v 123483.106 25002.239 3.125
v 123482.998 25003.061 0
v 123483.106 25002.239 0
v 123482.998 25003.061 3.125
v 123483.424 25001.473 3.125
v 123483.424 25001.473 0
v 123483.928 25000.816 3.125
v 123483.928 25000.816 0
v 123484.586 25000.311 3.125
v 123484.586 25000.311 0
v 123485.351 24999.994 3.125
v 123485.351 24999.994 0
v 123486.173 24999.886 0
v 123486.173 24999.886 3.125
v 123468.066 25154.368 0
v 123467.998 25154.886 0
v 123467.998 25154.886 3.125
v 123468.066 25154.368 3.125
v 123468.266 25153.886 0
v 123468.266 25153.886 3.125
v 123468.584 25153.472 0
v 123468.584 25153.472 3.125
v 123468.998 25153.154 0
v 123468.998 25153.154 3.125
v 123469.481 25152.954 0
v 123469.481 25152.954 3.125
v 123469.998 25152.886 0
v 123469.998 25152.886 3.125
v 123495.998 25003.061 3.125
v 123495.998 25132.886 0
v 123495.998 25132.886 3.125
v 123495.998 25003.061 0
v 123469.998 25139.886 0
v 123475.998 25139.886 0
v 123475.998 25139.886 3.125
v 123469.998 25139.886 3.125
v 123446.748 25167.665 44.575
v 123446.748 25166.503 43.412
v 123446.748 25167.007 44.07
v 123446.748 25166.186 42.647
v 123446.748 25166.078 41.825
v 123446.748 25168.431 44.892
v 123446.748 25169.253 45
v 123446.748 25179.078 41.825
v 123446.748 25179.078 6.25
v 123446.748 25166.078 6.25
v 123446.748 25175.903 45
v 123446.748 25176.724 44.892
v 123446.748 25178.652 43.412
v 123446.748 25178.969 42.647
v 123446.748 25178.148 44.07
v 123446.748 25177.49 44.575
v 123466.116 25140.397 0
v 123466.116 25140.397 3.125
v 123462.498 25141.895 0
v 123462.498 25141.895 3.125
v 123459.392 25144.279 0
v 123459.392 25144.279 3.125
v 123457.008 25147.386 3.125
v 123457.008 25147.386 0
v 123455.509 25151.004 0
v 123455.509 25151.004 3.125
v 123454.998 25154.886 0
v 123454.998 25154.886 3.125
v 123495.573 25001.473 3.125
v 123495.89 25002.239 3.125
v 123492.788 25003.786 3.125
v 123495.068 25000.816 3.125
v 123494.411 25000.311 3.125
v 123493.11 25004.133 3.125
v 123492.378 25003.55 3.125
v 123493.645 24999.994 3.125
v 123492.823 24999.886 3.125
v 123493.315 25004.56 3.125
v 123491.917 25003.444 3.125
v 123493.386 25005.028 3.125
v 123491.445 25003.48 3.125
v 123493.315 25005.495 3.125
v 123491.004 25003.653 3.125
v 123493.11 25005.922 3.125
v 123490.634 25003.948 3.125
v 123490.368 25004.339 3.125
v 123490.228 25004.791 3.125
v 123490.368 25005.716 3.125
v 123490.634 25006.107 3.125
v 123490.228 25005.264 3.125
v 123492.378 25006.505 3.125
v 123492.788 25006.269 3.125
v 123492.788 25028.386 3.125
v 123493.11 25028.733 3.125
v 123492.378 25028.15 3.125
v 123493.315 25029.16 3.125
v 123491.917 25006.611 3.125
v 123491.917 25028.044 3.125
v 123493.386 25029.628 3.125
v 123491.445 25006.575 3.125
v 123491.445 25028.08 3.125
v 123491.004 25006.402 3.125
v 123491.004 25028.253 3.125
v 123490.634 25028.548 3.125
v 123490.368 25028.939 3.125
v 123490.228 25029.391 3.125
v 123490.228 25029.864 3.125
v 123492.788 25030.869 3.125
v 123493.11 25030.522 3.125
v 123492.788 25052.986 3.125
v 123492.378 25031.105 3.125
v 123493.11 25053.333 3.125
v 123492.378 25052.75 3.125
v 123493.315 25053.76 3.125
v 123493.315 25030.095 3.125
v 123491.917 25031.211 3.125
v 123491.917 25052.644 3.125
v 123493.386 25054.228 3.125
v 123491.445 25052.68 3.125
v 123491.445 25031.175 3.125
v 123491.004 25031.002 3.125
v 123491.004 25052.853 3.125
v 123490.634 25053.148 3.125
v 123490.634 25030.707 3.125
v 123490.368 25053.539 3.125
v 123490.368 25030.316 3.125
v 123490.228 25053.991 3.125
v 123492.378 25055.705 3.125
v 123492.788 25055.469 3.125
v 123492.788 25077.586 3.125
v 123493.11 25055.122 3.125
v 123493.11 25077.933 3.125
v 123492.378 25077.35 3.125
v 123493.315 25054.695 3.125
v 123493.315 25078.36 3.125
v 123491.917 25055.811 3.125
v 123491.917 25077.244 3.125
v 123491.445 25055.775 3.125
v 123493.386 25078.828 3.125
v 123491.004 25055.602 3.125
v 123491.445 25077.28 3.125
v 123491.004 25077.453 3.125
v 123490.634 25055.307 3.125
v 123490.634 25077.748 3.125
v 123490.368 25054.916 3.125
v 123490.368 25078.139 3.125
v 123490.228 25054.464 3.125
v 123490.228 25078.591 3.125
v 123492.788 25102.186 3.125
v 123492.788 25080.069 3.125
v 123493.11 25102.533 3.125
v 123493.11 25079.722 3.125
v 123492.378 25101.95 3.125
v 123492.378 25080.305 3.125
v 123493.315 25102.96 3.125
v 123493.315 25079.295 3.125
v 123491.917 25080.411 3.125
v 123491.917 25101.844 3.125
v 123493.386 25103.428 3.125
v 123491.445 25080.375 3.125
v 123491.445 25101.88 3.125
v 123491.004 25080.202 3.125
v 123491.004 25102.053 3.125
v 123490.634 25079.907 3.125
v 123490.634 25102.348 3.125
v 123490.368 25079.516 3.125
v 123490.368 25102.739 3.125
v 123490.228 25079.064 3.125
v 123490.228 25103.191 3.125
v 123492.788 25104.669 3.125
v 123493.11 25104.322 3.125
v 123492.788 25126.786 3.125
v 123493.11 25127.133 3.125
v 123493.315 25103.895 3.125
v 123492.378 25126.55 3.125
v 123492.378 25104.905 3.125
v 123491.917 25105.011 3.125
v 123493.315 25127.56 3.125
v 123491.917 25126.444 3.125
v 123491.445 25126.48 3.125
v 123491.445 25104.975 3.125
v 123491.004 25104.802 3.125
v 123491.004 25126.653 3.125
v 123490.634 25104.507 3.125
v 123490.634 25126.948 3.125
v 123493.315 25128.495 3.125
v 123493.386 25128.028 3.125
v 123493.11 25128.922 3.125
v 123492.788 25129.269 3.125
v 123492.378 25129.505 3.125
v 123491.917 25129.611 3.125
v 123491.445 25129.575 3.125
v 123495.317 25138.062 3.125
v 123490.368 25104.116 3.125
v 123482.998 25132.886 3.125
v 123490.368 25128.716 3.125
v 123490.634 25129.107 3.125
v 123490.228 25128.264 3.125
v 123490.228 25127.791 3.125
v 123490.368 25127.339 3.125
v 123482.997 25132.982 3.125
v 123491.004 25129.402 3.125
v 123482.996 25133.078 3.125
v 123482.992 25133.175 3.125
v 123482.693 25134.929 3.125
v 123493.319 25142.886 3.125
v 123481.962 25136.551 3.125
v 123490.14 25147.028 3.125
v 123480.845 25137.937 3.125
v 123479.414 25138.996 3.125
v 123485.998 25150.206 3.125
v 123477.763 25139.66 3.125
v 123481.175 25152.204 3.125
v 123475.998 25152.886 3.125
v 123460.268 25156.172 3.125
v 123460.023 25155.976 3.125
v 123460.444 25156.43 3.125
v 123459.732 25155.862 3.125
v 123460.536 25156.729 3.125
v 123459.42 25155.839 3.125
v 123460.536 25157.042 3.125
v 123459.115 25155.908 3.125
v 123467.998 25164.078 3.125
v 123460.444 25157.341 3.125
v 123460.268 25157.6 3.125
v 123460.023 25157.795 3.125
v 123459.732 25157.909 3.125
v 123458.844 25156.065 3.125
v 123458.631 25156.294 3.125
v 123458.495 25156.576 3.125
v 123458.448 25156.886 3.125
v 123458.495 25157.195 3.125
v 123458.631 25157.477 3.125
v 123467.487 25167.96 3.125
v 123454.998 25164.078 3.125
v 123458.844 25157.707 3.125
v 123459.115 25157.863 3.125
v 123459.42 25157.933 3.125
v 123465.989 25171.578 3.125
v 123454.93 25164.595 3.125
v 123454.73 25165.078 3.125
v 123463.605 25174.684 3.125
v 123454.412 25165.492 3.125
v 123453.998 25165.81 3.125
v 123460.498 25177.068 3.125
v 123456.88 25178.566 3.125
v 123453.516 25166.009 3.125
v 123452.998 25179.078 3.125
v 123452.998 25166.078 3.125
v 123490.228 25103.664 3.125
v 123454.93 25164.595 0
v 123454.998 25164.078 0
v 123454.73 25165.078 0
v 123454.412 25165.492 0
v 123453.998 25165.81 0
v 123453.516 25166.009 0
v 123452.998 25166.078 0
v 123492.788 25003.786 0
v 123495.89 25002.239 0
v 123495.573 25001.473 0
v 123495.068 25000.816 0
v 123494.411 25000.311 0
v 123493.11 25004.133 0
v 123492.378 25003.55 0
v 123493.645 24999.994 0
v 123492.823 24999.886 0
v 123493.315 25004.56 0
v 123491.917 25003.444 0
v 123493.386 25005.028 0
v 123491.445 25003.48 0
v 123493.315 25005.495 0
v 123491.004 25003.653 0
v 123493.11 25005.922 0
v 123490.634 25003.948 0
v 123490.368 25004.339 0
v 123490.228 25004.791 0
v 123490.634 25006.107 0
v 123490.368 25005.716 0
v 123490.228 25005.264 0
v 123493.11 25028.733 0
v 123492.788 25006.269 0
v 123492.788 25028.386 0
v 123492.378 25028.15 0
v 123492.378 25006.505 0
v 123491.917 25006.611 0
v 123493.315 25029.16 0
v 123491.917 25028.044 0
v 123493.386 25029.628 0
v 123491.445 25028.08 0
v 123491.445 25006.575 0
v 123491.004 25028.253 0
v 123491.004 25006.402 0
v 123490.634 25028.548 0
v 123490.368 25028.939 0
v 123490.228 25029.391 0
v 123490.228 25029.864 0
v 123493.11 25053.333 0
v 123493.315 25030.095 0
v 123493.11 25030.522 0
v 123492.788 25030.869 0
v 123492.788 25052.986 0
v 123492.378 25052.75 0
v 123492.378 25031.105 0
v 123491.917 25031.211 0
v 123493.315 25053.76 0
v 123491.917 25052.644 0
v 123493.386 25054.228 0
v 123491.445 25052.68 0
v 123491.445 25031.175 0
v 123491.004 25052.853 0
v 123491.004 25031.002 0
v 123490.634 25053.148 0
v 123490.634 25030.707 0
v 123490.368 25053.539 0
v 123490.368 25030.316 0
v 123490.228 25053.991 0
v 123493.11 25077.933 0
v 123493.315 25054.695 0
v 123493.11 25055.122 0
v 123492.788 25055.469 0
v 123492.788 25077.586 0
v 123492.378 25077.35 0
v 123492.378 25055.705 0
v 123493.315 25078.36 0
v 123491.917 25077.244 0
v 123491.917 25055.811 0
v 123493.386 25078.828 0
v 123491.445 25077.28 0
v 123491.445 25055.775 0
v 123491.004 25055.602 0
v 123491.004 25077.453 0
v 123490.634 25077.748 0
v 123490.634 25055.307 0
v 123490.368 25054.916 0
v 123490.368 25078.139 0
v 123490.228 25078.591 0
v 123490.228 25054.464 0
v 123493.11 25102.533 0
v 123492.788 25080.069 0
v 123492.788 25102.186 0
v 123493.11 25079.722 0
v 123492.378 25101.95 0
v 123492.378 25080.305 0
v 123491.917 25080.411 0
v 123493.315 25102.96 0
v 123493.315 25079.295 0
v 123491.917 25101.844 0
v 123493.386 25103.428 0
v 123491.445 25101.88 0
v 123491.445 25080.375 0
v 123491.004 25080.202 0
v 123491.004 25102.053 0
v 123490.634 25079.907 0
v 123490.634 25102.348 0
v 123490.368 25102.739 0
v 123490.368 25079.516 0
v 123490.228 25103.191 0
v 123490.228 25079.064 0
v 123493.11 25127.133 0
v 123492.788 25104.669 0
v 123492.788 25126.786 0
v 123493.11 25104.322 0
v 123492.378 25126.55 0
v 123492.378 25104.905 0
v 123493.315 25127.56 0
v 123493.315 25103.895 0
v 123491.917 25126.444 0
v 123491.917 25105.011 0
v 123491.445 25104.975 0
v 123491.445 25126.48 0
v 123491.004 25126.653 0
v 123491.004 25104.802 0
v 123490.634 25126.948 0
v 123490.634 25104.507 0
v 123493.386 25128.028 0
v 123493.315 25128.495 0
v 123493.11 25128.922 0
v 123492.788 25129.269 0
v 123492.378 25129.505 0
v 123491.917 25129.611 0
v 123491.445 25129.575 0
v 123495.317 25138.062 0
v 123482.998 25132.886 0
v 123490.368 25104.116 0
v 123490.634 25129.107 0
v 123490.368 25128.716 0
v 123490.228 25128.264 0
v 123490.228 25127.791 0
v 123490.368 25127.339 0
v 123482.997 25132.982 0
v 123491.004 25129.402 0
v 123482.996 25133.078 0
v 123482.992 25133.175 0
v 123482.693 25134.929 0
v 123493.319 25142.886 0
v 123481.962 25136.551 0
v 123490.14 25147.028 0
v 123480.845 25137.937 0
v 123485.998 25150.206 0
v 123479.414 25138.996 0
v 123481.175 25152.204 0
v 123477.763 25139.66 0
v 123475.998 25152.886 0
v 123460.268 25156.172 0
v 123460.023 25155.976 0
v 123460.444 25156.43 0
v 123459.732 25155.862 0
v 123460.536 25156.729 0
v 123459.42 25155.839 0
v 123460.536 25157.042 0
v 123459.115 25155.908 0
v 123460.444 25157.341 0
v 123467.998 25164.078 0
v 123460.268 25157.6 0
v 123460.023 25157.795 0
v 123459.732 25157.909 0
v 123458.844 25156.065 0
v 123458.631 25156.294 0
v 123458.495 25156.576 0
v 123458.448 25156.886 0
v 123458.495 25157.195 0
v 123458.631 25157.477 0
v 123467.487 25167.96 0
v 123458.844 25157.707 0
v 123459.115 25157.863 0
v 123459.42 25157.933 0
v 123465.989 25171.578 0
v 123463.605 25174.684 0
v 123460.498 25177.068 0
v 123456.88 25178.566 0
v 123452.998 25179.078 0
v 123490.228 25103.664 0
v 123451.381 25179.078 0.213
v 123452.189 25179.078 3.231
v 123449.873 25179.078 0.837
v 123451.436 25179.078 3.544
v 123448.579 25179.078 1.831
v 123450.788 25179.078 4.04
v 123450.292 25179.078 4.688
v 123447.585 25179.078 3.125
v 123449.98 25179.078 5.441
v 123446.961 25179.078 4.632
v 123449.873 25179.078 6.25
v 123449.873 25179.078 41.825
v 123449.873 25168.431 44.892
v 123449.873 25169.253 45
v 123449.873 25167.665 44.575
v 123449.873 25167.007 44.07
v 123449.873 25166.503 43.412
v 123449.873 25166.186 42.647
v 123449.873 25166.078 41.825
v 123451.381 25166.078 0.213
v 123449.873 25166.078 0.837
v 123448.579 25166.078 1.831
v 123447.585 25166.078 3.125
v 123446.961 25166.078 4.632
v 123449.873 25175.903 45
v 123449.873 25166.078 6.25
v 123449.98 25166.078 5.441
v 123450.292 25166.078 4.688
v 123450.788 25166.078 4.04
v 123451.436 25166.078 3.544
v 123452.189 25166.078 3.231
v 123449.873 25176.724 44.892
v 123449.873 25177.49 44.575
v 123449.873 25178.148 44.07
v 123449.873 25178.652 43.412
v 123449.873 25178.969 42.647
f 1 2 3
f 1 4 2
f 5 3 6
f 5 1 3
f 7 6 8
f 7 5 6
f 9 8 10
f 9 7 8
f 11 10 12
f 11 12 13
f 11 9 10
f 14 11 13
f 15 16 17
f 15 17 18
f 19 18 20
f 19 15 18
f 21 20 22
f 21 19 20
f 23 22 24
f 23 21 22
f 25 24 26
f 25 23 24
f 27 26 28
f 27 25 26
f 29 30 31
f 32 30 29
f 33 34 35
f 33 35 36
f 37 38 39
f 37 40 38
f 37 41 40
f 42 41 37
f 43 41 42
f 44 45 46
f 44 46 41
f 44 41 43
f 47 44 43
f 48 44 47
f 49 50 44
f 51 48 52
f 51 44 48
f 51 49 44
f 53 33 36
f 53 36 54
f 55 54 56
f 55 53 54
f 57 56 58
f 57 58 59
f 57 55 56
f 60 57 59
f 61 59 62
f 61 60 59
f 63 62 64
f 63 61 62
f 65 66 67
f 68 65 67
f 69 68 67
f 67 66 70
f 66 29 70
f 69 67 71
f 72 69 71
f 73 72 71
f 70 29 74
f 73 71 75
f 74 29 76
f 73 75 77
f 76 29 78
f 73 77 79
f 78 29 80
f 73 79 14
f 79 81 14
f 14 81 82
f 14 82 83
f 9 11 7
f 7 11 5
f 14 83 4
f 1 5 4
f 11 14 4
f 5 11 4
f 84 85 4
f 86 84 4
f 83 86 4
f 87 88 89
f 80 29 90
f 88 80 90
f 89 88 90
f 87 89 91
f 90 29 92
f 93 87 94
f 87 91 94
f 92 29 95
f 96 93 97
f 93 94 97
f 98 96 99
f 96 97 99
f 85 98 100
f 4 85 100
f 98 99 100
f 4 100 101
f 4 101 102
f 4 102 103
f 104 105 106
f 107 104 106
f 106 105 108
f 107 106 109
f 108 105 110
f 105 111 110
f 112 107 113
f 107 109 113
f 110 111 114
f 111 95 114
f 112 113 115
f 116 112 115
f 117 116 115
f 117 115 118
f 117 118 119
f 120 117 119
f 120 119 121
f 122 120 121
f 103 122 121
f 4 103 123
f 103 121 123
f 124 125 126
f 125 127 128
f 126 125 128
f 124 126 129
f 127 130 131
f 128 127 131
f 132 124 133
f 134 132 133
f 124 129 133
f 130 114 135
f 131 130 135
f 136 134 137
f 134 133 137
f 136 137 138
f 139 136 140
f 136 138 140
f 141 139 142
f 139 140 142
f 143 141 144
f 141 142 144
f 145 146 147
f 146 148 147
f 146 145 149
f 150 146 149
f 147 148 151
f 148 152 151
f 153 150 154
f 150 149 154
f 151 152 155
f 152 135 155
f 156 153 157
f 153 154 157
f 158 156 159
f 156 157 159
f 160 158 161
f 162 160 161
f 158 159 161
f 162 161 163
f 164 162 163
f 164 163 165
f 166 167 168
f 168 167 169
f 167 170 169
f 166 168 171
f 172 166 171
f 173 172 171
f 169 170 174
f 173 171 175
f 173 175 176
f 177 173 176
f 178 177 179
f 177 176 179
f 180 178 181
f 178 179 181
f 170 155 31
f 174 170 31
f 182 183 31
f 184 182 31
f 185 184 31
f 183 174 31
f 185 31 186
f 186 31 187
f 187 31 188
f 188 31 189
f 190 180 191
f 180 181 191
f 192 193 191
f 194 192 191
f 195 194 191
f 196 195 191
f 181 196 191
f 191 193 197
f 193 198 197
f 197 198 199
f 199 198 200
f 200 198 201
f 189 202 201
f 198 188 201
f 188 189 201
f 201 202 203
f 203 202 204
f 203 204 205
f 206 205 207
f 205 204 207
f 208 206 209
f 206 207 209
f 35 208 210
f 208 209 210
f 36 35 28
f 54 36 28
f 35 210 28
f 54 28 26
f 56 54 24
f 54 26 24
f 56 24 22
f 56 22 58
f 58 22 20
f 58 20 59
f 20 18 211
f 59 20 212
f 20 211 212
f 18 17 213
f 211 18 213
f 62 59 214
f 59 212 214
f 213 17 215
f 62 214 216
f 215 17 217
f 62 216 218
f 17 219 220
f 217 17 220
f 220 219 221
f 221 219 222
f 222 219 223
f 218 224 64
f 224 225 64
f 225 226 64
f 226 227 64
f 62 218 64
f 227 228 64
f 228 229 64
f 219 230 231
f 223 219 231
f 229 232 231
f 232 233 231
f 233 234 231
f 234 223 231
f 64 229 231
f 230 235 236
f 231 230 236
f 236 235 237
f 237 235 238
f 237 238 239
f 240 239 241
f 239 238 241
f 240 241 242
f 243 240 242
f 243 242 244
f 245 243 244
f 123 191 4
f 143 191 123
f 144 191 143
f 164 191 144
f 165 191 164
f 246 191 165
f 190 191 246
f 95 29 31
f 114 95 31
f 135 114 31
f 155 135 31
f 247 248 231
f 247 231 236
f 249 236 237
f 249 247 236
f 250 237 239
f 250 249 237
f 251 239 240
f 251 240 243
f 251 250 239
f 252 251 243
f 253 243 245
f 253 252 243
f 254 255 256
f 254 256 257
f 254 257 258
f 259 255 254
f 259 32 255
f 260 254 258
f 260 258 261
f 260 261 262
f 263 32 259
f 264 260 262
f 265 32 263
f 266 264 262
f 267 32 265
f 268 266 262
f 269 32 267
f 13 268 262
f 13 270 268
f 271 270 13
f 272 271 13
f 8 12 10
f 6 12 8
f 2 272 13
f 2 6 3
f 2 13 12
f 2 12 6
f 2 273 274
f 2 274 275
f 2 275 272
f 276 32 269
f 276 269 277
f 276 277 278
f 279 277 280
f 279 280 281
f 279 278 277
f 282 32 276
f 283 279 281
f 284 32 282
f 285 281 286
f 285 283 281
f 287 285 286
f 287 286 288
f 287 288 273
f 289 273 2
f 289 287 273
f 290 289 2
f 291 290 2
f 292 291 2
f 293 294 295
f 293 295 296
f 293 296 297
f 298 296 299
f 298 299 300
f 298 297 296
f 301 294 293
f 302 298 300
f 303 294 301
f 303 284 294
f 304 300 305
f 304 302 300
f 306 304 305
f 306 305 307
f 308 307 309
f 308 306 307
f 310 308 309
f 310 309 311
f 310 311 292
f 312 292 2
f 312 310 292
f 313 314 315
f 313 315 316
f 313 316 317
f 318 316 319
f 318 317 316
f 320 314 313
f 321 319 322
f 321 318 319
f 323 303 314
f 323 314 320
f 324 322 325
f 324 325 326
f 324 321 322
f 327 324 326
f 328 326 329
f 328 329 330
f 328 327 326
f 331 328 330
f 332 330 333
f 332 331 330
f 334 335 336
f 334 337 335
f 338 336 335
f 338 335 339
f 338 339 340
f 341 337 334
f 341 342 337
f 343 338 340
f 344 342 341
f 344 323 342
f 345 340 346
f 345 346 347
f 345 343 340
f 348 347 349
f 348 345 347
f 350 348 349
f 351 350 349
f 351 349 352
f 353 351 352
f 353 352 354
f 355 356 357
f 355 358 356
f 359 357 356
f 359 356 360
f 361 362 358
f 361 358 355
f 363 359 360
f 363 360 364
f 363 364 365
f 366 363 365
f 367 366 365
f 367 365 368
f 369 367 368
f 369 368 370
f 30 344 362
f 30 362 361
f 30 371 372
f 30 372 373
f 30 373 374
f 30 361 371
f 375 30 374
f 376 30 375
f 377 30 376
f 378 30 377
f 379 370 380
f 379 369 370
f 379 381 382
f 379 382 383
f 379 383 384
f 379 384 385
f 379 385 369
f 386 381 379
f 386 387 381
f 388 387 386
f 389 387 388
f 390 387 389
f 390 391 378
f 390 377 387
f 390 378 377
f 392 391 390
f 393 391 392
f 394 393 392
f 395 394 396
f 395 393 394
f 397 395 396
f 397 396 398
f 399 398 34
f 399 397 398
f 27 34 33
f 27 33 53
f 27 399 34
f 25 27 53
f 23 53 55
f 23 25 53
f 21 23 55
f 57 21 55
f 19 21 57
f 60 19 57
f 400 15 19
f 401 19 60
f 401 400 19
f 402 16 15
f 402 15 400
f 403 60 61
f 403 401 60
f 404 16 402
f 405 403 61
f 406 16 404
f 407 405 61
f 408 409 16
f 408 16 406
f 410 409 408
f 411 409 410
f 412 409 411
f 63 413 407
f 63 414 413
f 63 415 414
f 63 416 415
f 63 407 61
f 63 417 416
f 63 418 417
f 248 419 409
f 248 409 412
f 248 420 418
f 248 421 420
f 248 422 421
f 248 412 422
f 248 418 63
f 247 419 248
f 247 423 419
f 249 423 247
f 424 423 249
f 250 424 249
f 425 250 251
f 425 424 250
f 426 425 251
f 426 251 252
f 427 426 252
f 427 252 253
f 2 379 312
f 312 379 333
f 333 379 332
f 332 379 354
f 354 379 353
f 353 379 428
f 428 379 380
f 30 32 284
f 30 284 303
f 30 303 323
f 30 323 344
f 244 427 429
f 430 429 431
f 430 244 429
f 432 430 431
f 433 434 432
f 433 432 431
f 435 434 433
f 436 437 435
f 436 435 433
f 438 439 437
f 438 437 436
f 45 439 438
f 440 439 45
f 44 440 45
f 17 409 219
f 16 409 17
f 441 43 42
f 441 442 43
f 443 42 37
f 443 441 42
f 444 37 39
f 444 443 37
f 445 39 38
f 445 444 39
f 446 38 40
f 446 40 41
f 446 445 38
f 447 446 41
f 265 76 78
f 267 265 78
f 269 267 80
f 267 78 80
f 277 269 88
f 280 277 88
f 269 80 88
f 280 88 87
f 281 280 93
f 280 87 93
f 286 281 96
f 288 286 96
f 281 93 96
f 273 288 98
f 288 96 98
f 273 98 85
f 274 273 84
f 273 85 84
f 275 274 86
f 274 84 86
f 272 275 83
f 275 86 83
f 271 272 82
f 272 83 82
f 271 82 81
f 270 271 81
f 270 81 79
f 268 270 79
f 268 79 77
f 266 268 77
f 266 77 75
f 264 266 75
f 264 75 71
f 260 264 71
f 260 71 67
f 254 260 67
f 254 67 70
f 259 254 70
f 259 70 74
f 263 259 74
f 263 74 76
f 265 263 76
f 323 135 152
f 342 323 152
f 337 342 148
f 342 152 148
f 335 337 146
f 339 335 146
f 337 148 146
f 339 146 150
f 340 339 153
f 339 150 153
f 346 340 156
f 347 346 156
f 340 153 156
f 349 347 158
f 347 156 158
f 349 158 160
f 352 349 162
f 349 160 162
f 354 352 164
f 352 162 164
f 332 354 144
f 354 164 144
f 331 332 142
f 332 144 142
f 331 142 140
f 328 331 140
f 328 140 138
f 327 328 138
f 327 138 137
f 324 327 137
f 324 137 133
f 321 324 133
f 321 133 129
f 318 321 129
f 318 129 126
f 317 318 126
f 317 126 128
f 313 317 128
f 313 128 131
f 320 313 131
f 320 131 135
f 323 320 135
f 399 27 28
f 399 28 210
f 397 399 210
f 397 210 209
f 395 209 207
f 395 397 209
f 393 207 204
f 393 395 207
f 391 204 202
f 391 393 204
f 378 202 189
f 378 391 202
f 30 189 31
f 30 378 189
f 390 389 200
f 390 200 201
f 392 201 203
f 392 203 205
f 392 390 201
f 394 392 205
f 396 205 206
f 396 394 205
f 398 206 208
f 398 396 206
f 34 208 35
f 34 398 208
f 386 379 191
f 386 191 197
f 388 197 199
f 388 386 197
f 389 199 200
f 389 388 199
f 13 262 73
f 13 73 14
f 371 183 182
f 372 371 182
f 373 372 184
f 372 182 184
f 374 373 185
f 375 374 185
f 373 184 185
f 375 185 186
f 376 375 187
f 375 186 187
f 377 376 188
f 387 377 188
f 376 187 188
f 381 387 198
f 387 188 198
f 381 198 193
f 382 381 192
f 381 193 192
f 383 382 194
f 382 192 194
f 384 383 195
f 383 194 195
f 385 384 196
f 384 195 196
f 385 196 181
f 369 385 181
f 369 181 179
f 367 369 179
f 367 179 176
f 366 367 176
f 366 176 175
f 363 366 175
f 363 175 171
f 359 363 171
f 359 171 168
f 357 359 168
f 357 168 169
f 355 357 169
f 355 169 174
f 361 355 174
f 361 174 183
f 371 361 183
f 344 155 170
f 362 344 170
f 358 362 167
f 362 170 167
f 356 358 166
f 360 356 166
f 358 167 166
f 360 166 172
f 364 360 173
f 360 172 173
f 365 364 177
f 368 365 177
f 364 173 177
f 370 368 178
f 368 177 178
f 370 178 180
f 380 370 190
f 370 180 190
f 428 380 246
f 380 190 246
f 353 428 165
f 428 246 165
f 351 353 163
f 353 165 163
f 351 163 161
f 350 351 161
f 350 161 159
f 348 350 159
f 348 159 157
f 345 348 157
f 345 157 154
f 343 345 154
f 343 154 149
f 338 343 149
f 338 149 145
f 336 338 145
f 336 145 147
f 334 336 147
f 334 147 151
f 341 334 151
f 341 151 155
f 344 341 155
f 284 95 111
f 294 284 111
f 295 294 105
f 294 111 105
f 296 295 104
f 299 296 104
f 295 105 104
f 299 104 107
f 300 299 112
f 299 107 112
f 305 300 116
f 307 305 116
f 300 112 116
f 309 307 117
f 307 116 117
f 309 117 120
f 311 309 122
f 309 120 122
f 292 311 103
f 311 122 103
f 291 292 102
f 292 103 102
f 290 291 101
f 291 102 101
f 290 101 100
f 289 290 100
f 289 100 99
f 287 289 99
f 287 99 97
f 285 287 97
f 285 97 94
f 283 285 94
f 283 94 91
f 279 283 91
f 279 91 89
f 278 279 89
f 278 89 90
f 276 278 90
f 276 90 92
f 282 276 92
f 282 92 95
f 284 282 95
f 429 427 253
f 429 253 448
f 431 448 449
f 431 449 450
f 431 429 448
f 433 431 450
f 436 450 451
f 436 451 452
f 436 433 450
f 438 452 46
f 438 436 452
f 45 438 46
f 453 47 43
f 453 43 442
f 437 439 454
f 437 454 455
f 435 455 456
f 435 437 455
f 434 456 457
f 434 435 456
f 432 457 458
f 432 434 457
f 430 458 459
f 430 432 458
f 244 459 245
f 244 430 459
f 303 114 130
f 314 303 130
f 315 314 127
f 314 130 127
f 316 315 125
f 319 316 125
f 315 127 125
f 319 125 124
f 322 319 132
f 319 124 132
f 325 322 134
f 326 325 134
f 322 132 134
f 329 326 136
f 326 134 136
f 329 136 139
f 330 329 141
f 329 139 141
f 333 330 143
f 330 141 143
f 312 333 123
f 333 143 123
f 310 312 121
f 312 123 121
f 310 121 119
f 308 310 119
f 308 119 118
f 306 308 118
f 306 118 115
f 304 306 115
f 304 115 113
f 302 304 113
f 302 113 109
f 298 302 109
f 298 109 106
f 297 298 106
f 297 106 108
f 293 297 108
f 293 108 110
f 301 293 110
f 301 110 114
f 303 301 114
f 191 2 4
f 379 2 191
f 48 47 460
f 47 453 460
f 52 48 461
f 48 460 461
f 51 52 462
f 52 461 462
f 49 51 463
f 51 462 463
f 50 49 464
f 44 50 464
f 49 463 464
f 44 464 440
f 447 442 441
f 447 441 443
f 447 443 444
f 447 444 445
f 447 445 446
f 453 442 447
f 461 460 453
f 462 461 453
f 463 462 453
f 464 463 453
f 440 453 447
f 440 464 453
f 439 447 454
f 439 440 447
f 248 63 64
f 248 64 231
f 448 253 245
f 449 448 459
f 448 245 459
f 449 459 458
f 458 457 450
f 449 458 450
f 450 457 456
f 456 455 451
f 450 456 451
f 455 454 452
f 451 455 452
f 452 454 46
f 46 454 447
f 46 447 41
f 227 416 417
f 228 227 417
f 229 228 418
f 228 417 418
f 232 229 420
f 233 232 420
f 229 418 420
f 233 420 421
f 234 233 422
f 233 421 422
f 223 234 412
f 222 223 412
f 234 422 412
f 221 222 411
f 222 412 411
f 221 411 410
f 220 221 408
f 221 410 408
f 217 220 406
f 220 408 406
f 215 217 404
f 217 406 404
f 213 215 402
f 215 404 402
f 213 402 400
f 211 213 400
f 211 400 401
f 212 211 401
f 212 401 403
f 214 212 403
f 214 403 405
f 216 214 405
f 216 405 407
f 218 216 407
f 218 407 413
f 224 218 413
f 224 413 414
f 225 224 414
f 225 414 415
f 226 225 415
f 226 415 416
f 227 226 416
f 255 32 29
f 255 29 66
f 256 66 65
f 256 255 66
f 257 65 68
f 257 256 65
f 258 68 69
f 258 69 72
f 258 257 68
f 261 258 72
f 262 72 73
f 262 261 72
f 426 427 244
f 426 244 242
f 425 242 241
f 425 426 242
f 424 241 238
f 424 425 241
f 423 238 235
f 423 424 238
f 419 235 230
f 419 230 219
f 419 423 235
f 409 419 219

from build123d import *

# Parameters (mm, degrees)
BOSS_EXTRUDE1_DEPTH = 3.125
EDGE_FLANGE1_DEPTH  = 13
FILLET1_R           = 3.175
SKETCH10_R          = 1.5875
CUT_EXTRUDE1_DEPTH  = 10
LPATTERN1_COUNT     = 6
LPATTERN1_PITCH     = 24.6
SKETCH13_R          = 1.05
CUT_EXTRUDE2_DEPTH  = 10


# Sheet-metal steps are written as plain solids
with BuildPart() as part:
    # Sketch1 → Boss-Extrude1 (new body)
    with BuildSketch(Plane.XY):
        with BuildLine():
            Line((123482.998157255, 24999.885796135), (123482.998157255, 25132.885796135))
            ThreePointArc((123482.998157255, 25132.885796135), (123482.99666513, 25133.030321276), (123482.992189393, 25133.174784804))
            ThreePointArc((123482.992189393, 25133.174784804), (123480.844655225, 25137.936682931), (123475.998158089, 25139.885796135))
            Line((123475.998158089, 25139.885796135), (123469.998184079, 25139.88579685))
            ThreePointArc((123469.998184079, 25139.88579685), (123459.391582886, 25144.279196396), (123454.998185868, 25154.885798636))
            Line((123454.998185868, 25154.885798636), (123454.998186963, 25164.077536847))
            ThreePointArc((123454.998186963, 25164.077536847), (123454.412390106, 25165.491761067), (123452.998157255, 25166.077537085))
            Line((123452.998157255, 25166.077537085), (123452.998157255, 25179.077537085))
            ThreePointArc((123452.998157255, 25179.077537085), (123463.604778809, 25174.684148675), (123467.998186963, 25164.077535299))
            Line((123467.998186963, 25164.077535299), (123467.998185868, 25154.885797087))
            ThreePointArc((123467.998185868, 25154.885797087), (123468.583972137, 25153.471583456), (123469.998185629, 25152.88579685))
            Line((123469.998185629, 25152.88579685), (123475.998159637, 25152.885796136))
            ThreePointArc((123475.998159637, 25152.885796136), (123490.140293721, 25147.027930917), (123495.998157255, 25132.885796135))
            Line((123495.998157255, 25132.885796135), (123495.998157255, 25003.060796135))
            ThreePointArc((123495.998157255, 25003.060796135), (123495.068221285, 25000.815732105), (123492.823157255, 24999.885796135))
            Line((123492.823157255, 24999.885796135), (123482.998157255, 24999.885796135))
        make_face()
    extrude(amount=BOSS_EXTRUDE1_DEPTH)

    # Edge-Flange1 section (across the edge) → Edge-Flange1 (add)
    with BuildSketch(Plane(origin=(123449.873157255, 25179.077537085, 3.125), x_dir=(1, 0, 0), z_dir=(0, -1, 0))):
        with BuildLine():
            Line((-3.125, 3.125), (-3.125, 41.875))
            Line((-3.125, 41.875), (0, 41.875))
            Line((0, 41.875), (0, 3.125))
            ThreePointArc((0, 3.125), (0.915291309, 0.915291309), (3.125, 0))
            Line((3.125, 0), (3.125, -3.125))
            ThreePointArc((3.125, -3.125), (-1.294417382, -1.294417382), (-3.125, 3.125))
        make_face()
    extrude(amount=EDGE_FLANGE1_DEPTH)

    # Fillet1
    fillet1_edges = [part.edges().sort_by_distance(p)[0] for p in [
        (123482.998157255, 24999.885796135, 1.5625),
        (123448.310657255, 25179.077537085, 45),
        (123448.310657255, 25166.077537085, 45),
    ]]
    fillet(fillet1_edges, radius=FILLET1_R)

    # Sketch10 → Cut-Extrude1 (cut)
    with BuildSketch(Plane.XY.offset(3.125)):
        with Locations((123491.798157255, 25005.027537086)):
            Circle(SKETCH10_R)
    cut_extrude1 = extrude(amount=-CUT_EXTRUDE1_DEPTH, mode=Mode.SUBTRACT)

    # LPattern1: Cut-Extrude1 ×6
    with Locations(*[(0, i * LPATTERN1_PITCH, 0) for i in range(1, LPATTERN1_COUNT)]):
        add(cut_extrude1, mode=Mode.SUBTRACT)

    # Sketch13 → Cut-Extrude2 (cut)
    with BuildSketch(Plane(origin=(0, 0, 0), x_dir=(-1, 0, 0), z_dir=(0, 0, -1))):
        with Locations((-123459.498186107, 25156.8857981)):
            Circle(SKETCH13_R)
    extrude(amount=-CUT_EXTRUDE2_DEPTH, mode=Mode.SUBTRACT)


solid = part.part
